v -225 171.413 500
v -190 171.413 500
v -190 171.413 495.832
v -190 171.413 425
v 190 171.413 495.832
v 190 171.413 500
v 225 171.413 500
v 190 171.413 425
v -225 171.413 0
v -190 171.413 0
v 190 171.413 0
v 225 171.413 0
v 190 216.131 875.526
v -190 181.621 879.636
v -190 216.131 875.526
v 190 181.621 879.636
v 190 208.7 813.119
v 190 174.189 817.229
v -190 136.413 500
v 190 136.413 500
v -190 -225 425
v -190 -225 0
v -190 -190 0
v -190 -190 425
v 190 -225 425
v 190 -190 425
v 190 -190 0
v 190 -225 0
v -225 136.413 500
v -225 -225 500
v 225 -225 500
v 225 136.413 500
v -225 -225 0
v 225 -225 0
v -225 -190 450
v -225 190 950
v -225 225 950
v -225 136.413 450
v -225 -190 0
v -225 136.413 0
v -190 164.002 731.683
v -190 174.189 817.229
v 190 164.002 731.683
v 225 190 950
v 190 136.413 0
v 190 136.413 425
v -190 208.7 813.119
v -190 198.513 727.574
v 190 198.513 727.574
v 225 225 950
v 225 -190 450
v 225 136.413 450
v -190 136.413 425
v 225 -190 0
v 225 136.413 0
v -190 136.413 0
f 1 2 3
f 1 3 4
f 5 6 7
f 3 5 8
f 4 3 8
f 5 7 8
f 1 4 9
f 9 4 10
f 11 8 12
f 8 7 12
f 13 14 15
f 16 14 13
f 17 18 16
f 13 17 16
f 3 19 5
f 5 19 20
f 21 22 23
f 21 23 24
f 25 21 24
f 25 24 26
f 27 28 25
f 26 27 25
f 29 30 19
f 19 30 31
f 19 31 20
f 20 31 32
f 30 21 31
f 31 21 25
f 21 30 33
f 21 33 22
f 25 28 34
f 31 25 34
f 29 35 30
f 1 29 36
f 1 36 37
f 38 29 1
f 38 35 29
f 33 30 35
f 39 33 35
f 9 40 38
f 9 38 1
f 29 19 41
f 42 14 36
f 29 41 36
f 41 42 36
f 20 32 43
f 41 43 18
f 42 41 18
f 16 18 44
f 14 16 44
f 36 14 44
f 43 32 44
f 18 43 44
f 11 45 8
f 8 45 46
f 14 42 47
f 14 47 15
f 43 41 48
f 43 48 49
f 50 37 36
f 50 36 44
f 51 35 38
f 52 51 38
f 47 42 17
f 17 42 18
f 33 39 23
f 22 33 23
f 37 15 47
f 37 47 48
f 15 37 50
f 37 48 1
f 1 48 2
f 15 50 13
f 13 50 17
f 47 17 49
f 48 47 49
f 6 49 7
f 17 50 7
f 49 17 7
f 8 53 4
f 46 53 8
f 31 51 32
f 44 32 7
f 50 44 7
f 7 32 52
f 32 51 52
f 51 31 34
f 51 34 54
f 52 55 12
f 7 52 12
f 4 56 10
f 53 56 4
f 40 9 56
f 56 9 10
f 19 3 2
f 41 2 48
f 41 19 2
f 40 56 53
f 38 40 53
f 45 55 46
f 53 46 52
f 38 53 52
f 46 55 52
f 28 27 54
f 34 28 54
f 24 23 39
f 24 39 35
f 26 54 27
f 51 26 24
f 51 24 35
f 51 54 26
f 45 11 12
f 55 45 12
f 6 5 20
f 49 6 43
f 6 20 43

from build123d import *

# Parameters (mm, degrees)
F0_W     = 450
F0_H     = 450
F1_DEPTH = 950
F2_W     = 53.5874837637
F2_H     = 50
F2_H_2   = 450
F2_W_2   = 326.4125162363
F3_DEPTH = 450.001
F4_W     = 380
F4_H     = 425
F5_DEPTH = 450.001
F6_W     = 380
F6_H     = 233.320171364
F6_H_2   = 62.848264869
F7_DEPTH = 147.0908754191


with BuildPart() as f1:
    # F0 (on Top) → F1 (new body)
    with BuildSketch(Plane.XY):
        Rectangle(F0_W, F0_H)
    extrude(amount=F1_DEPTH)

    # F2 (on face) → F3 (cut, through all)
    with BuildSketch(Plane.YZ.offset(225)):
        Polygon((-225, 950), (-225, 500), (136.4125162363, 500), (190, 950), align=None)
        Polygon((225, 950), (171.4125162363, 500), (225, 500), align=None)
        with Locations((198.2062581182, 475)):
            Rectangle(F2_W, F2_H)
        with Locations((198.2062581182, 225)):
            Rectangle(F2_W, F2_H_2)
        with Locations((-26.7937418818, 225)):
            Rectangle(F2_W_2, F2_H_2)
    extrude(amount=-F3_DEPTH, mode=Mode.SUBTRACT)

    # F4 (on face) → F5 (cut, through all)
    with BuildSketch(Plane.XZ.offset(225)):
        with Locations((0, 212.5)):
            Rectangle(F4_W, F4_H)
    extrude(amount=-F5_DEPTH, mode=Mode.SUBTRACT)

    # F6 (on face) → F7 (cut, through all)
    with BuildSketch(Plane(origin=(0, 75.7960170498, -9.0260396289), x_dir=(1, 0, 0), z_dir=(0, -0.9929841149, 0.1182478225))):
        with Locations((0, 629.2826261481)):
            Rectangle(F6_W, F6_H)
        with Locations((0, 863.5165368001)):
            Rectangle(F6_W, F6_H_2)
    extrude(amount=-F7_DEPTH, mode=Mode.SUBTRACT)


solid = f1.part
